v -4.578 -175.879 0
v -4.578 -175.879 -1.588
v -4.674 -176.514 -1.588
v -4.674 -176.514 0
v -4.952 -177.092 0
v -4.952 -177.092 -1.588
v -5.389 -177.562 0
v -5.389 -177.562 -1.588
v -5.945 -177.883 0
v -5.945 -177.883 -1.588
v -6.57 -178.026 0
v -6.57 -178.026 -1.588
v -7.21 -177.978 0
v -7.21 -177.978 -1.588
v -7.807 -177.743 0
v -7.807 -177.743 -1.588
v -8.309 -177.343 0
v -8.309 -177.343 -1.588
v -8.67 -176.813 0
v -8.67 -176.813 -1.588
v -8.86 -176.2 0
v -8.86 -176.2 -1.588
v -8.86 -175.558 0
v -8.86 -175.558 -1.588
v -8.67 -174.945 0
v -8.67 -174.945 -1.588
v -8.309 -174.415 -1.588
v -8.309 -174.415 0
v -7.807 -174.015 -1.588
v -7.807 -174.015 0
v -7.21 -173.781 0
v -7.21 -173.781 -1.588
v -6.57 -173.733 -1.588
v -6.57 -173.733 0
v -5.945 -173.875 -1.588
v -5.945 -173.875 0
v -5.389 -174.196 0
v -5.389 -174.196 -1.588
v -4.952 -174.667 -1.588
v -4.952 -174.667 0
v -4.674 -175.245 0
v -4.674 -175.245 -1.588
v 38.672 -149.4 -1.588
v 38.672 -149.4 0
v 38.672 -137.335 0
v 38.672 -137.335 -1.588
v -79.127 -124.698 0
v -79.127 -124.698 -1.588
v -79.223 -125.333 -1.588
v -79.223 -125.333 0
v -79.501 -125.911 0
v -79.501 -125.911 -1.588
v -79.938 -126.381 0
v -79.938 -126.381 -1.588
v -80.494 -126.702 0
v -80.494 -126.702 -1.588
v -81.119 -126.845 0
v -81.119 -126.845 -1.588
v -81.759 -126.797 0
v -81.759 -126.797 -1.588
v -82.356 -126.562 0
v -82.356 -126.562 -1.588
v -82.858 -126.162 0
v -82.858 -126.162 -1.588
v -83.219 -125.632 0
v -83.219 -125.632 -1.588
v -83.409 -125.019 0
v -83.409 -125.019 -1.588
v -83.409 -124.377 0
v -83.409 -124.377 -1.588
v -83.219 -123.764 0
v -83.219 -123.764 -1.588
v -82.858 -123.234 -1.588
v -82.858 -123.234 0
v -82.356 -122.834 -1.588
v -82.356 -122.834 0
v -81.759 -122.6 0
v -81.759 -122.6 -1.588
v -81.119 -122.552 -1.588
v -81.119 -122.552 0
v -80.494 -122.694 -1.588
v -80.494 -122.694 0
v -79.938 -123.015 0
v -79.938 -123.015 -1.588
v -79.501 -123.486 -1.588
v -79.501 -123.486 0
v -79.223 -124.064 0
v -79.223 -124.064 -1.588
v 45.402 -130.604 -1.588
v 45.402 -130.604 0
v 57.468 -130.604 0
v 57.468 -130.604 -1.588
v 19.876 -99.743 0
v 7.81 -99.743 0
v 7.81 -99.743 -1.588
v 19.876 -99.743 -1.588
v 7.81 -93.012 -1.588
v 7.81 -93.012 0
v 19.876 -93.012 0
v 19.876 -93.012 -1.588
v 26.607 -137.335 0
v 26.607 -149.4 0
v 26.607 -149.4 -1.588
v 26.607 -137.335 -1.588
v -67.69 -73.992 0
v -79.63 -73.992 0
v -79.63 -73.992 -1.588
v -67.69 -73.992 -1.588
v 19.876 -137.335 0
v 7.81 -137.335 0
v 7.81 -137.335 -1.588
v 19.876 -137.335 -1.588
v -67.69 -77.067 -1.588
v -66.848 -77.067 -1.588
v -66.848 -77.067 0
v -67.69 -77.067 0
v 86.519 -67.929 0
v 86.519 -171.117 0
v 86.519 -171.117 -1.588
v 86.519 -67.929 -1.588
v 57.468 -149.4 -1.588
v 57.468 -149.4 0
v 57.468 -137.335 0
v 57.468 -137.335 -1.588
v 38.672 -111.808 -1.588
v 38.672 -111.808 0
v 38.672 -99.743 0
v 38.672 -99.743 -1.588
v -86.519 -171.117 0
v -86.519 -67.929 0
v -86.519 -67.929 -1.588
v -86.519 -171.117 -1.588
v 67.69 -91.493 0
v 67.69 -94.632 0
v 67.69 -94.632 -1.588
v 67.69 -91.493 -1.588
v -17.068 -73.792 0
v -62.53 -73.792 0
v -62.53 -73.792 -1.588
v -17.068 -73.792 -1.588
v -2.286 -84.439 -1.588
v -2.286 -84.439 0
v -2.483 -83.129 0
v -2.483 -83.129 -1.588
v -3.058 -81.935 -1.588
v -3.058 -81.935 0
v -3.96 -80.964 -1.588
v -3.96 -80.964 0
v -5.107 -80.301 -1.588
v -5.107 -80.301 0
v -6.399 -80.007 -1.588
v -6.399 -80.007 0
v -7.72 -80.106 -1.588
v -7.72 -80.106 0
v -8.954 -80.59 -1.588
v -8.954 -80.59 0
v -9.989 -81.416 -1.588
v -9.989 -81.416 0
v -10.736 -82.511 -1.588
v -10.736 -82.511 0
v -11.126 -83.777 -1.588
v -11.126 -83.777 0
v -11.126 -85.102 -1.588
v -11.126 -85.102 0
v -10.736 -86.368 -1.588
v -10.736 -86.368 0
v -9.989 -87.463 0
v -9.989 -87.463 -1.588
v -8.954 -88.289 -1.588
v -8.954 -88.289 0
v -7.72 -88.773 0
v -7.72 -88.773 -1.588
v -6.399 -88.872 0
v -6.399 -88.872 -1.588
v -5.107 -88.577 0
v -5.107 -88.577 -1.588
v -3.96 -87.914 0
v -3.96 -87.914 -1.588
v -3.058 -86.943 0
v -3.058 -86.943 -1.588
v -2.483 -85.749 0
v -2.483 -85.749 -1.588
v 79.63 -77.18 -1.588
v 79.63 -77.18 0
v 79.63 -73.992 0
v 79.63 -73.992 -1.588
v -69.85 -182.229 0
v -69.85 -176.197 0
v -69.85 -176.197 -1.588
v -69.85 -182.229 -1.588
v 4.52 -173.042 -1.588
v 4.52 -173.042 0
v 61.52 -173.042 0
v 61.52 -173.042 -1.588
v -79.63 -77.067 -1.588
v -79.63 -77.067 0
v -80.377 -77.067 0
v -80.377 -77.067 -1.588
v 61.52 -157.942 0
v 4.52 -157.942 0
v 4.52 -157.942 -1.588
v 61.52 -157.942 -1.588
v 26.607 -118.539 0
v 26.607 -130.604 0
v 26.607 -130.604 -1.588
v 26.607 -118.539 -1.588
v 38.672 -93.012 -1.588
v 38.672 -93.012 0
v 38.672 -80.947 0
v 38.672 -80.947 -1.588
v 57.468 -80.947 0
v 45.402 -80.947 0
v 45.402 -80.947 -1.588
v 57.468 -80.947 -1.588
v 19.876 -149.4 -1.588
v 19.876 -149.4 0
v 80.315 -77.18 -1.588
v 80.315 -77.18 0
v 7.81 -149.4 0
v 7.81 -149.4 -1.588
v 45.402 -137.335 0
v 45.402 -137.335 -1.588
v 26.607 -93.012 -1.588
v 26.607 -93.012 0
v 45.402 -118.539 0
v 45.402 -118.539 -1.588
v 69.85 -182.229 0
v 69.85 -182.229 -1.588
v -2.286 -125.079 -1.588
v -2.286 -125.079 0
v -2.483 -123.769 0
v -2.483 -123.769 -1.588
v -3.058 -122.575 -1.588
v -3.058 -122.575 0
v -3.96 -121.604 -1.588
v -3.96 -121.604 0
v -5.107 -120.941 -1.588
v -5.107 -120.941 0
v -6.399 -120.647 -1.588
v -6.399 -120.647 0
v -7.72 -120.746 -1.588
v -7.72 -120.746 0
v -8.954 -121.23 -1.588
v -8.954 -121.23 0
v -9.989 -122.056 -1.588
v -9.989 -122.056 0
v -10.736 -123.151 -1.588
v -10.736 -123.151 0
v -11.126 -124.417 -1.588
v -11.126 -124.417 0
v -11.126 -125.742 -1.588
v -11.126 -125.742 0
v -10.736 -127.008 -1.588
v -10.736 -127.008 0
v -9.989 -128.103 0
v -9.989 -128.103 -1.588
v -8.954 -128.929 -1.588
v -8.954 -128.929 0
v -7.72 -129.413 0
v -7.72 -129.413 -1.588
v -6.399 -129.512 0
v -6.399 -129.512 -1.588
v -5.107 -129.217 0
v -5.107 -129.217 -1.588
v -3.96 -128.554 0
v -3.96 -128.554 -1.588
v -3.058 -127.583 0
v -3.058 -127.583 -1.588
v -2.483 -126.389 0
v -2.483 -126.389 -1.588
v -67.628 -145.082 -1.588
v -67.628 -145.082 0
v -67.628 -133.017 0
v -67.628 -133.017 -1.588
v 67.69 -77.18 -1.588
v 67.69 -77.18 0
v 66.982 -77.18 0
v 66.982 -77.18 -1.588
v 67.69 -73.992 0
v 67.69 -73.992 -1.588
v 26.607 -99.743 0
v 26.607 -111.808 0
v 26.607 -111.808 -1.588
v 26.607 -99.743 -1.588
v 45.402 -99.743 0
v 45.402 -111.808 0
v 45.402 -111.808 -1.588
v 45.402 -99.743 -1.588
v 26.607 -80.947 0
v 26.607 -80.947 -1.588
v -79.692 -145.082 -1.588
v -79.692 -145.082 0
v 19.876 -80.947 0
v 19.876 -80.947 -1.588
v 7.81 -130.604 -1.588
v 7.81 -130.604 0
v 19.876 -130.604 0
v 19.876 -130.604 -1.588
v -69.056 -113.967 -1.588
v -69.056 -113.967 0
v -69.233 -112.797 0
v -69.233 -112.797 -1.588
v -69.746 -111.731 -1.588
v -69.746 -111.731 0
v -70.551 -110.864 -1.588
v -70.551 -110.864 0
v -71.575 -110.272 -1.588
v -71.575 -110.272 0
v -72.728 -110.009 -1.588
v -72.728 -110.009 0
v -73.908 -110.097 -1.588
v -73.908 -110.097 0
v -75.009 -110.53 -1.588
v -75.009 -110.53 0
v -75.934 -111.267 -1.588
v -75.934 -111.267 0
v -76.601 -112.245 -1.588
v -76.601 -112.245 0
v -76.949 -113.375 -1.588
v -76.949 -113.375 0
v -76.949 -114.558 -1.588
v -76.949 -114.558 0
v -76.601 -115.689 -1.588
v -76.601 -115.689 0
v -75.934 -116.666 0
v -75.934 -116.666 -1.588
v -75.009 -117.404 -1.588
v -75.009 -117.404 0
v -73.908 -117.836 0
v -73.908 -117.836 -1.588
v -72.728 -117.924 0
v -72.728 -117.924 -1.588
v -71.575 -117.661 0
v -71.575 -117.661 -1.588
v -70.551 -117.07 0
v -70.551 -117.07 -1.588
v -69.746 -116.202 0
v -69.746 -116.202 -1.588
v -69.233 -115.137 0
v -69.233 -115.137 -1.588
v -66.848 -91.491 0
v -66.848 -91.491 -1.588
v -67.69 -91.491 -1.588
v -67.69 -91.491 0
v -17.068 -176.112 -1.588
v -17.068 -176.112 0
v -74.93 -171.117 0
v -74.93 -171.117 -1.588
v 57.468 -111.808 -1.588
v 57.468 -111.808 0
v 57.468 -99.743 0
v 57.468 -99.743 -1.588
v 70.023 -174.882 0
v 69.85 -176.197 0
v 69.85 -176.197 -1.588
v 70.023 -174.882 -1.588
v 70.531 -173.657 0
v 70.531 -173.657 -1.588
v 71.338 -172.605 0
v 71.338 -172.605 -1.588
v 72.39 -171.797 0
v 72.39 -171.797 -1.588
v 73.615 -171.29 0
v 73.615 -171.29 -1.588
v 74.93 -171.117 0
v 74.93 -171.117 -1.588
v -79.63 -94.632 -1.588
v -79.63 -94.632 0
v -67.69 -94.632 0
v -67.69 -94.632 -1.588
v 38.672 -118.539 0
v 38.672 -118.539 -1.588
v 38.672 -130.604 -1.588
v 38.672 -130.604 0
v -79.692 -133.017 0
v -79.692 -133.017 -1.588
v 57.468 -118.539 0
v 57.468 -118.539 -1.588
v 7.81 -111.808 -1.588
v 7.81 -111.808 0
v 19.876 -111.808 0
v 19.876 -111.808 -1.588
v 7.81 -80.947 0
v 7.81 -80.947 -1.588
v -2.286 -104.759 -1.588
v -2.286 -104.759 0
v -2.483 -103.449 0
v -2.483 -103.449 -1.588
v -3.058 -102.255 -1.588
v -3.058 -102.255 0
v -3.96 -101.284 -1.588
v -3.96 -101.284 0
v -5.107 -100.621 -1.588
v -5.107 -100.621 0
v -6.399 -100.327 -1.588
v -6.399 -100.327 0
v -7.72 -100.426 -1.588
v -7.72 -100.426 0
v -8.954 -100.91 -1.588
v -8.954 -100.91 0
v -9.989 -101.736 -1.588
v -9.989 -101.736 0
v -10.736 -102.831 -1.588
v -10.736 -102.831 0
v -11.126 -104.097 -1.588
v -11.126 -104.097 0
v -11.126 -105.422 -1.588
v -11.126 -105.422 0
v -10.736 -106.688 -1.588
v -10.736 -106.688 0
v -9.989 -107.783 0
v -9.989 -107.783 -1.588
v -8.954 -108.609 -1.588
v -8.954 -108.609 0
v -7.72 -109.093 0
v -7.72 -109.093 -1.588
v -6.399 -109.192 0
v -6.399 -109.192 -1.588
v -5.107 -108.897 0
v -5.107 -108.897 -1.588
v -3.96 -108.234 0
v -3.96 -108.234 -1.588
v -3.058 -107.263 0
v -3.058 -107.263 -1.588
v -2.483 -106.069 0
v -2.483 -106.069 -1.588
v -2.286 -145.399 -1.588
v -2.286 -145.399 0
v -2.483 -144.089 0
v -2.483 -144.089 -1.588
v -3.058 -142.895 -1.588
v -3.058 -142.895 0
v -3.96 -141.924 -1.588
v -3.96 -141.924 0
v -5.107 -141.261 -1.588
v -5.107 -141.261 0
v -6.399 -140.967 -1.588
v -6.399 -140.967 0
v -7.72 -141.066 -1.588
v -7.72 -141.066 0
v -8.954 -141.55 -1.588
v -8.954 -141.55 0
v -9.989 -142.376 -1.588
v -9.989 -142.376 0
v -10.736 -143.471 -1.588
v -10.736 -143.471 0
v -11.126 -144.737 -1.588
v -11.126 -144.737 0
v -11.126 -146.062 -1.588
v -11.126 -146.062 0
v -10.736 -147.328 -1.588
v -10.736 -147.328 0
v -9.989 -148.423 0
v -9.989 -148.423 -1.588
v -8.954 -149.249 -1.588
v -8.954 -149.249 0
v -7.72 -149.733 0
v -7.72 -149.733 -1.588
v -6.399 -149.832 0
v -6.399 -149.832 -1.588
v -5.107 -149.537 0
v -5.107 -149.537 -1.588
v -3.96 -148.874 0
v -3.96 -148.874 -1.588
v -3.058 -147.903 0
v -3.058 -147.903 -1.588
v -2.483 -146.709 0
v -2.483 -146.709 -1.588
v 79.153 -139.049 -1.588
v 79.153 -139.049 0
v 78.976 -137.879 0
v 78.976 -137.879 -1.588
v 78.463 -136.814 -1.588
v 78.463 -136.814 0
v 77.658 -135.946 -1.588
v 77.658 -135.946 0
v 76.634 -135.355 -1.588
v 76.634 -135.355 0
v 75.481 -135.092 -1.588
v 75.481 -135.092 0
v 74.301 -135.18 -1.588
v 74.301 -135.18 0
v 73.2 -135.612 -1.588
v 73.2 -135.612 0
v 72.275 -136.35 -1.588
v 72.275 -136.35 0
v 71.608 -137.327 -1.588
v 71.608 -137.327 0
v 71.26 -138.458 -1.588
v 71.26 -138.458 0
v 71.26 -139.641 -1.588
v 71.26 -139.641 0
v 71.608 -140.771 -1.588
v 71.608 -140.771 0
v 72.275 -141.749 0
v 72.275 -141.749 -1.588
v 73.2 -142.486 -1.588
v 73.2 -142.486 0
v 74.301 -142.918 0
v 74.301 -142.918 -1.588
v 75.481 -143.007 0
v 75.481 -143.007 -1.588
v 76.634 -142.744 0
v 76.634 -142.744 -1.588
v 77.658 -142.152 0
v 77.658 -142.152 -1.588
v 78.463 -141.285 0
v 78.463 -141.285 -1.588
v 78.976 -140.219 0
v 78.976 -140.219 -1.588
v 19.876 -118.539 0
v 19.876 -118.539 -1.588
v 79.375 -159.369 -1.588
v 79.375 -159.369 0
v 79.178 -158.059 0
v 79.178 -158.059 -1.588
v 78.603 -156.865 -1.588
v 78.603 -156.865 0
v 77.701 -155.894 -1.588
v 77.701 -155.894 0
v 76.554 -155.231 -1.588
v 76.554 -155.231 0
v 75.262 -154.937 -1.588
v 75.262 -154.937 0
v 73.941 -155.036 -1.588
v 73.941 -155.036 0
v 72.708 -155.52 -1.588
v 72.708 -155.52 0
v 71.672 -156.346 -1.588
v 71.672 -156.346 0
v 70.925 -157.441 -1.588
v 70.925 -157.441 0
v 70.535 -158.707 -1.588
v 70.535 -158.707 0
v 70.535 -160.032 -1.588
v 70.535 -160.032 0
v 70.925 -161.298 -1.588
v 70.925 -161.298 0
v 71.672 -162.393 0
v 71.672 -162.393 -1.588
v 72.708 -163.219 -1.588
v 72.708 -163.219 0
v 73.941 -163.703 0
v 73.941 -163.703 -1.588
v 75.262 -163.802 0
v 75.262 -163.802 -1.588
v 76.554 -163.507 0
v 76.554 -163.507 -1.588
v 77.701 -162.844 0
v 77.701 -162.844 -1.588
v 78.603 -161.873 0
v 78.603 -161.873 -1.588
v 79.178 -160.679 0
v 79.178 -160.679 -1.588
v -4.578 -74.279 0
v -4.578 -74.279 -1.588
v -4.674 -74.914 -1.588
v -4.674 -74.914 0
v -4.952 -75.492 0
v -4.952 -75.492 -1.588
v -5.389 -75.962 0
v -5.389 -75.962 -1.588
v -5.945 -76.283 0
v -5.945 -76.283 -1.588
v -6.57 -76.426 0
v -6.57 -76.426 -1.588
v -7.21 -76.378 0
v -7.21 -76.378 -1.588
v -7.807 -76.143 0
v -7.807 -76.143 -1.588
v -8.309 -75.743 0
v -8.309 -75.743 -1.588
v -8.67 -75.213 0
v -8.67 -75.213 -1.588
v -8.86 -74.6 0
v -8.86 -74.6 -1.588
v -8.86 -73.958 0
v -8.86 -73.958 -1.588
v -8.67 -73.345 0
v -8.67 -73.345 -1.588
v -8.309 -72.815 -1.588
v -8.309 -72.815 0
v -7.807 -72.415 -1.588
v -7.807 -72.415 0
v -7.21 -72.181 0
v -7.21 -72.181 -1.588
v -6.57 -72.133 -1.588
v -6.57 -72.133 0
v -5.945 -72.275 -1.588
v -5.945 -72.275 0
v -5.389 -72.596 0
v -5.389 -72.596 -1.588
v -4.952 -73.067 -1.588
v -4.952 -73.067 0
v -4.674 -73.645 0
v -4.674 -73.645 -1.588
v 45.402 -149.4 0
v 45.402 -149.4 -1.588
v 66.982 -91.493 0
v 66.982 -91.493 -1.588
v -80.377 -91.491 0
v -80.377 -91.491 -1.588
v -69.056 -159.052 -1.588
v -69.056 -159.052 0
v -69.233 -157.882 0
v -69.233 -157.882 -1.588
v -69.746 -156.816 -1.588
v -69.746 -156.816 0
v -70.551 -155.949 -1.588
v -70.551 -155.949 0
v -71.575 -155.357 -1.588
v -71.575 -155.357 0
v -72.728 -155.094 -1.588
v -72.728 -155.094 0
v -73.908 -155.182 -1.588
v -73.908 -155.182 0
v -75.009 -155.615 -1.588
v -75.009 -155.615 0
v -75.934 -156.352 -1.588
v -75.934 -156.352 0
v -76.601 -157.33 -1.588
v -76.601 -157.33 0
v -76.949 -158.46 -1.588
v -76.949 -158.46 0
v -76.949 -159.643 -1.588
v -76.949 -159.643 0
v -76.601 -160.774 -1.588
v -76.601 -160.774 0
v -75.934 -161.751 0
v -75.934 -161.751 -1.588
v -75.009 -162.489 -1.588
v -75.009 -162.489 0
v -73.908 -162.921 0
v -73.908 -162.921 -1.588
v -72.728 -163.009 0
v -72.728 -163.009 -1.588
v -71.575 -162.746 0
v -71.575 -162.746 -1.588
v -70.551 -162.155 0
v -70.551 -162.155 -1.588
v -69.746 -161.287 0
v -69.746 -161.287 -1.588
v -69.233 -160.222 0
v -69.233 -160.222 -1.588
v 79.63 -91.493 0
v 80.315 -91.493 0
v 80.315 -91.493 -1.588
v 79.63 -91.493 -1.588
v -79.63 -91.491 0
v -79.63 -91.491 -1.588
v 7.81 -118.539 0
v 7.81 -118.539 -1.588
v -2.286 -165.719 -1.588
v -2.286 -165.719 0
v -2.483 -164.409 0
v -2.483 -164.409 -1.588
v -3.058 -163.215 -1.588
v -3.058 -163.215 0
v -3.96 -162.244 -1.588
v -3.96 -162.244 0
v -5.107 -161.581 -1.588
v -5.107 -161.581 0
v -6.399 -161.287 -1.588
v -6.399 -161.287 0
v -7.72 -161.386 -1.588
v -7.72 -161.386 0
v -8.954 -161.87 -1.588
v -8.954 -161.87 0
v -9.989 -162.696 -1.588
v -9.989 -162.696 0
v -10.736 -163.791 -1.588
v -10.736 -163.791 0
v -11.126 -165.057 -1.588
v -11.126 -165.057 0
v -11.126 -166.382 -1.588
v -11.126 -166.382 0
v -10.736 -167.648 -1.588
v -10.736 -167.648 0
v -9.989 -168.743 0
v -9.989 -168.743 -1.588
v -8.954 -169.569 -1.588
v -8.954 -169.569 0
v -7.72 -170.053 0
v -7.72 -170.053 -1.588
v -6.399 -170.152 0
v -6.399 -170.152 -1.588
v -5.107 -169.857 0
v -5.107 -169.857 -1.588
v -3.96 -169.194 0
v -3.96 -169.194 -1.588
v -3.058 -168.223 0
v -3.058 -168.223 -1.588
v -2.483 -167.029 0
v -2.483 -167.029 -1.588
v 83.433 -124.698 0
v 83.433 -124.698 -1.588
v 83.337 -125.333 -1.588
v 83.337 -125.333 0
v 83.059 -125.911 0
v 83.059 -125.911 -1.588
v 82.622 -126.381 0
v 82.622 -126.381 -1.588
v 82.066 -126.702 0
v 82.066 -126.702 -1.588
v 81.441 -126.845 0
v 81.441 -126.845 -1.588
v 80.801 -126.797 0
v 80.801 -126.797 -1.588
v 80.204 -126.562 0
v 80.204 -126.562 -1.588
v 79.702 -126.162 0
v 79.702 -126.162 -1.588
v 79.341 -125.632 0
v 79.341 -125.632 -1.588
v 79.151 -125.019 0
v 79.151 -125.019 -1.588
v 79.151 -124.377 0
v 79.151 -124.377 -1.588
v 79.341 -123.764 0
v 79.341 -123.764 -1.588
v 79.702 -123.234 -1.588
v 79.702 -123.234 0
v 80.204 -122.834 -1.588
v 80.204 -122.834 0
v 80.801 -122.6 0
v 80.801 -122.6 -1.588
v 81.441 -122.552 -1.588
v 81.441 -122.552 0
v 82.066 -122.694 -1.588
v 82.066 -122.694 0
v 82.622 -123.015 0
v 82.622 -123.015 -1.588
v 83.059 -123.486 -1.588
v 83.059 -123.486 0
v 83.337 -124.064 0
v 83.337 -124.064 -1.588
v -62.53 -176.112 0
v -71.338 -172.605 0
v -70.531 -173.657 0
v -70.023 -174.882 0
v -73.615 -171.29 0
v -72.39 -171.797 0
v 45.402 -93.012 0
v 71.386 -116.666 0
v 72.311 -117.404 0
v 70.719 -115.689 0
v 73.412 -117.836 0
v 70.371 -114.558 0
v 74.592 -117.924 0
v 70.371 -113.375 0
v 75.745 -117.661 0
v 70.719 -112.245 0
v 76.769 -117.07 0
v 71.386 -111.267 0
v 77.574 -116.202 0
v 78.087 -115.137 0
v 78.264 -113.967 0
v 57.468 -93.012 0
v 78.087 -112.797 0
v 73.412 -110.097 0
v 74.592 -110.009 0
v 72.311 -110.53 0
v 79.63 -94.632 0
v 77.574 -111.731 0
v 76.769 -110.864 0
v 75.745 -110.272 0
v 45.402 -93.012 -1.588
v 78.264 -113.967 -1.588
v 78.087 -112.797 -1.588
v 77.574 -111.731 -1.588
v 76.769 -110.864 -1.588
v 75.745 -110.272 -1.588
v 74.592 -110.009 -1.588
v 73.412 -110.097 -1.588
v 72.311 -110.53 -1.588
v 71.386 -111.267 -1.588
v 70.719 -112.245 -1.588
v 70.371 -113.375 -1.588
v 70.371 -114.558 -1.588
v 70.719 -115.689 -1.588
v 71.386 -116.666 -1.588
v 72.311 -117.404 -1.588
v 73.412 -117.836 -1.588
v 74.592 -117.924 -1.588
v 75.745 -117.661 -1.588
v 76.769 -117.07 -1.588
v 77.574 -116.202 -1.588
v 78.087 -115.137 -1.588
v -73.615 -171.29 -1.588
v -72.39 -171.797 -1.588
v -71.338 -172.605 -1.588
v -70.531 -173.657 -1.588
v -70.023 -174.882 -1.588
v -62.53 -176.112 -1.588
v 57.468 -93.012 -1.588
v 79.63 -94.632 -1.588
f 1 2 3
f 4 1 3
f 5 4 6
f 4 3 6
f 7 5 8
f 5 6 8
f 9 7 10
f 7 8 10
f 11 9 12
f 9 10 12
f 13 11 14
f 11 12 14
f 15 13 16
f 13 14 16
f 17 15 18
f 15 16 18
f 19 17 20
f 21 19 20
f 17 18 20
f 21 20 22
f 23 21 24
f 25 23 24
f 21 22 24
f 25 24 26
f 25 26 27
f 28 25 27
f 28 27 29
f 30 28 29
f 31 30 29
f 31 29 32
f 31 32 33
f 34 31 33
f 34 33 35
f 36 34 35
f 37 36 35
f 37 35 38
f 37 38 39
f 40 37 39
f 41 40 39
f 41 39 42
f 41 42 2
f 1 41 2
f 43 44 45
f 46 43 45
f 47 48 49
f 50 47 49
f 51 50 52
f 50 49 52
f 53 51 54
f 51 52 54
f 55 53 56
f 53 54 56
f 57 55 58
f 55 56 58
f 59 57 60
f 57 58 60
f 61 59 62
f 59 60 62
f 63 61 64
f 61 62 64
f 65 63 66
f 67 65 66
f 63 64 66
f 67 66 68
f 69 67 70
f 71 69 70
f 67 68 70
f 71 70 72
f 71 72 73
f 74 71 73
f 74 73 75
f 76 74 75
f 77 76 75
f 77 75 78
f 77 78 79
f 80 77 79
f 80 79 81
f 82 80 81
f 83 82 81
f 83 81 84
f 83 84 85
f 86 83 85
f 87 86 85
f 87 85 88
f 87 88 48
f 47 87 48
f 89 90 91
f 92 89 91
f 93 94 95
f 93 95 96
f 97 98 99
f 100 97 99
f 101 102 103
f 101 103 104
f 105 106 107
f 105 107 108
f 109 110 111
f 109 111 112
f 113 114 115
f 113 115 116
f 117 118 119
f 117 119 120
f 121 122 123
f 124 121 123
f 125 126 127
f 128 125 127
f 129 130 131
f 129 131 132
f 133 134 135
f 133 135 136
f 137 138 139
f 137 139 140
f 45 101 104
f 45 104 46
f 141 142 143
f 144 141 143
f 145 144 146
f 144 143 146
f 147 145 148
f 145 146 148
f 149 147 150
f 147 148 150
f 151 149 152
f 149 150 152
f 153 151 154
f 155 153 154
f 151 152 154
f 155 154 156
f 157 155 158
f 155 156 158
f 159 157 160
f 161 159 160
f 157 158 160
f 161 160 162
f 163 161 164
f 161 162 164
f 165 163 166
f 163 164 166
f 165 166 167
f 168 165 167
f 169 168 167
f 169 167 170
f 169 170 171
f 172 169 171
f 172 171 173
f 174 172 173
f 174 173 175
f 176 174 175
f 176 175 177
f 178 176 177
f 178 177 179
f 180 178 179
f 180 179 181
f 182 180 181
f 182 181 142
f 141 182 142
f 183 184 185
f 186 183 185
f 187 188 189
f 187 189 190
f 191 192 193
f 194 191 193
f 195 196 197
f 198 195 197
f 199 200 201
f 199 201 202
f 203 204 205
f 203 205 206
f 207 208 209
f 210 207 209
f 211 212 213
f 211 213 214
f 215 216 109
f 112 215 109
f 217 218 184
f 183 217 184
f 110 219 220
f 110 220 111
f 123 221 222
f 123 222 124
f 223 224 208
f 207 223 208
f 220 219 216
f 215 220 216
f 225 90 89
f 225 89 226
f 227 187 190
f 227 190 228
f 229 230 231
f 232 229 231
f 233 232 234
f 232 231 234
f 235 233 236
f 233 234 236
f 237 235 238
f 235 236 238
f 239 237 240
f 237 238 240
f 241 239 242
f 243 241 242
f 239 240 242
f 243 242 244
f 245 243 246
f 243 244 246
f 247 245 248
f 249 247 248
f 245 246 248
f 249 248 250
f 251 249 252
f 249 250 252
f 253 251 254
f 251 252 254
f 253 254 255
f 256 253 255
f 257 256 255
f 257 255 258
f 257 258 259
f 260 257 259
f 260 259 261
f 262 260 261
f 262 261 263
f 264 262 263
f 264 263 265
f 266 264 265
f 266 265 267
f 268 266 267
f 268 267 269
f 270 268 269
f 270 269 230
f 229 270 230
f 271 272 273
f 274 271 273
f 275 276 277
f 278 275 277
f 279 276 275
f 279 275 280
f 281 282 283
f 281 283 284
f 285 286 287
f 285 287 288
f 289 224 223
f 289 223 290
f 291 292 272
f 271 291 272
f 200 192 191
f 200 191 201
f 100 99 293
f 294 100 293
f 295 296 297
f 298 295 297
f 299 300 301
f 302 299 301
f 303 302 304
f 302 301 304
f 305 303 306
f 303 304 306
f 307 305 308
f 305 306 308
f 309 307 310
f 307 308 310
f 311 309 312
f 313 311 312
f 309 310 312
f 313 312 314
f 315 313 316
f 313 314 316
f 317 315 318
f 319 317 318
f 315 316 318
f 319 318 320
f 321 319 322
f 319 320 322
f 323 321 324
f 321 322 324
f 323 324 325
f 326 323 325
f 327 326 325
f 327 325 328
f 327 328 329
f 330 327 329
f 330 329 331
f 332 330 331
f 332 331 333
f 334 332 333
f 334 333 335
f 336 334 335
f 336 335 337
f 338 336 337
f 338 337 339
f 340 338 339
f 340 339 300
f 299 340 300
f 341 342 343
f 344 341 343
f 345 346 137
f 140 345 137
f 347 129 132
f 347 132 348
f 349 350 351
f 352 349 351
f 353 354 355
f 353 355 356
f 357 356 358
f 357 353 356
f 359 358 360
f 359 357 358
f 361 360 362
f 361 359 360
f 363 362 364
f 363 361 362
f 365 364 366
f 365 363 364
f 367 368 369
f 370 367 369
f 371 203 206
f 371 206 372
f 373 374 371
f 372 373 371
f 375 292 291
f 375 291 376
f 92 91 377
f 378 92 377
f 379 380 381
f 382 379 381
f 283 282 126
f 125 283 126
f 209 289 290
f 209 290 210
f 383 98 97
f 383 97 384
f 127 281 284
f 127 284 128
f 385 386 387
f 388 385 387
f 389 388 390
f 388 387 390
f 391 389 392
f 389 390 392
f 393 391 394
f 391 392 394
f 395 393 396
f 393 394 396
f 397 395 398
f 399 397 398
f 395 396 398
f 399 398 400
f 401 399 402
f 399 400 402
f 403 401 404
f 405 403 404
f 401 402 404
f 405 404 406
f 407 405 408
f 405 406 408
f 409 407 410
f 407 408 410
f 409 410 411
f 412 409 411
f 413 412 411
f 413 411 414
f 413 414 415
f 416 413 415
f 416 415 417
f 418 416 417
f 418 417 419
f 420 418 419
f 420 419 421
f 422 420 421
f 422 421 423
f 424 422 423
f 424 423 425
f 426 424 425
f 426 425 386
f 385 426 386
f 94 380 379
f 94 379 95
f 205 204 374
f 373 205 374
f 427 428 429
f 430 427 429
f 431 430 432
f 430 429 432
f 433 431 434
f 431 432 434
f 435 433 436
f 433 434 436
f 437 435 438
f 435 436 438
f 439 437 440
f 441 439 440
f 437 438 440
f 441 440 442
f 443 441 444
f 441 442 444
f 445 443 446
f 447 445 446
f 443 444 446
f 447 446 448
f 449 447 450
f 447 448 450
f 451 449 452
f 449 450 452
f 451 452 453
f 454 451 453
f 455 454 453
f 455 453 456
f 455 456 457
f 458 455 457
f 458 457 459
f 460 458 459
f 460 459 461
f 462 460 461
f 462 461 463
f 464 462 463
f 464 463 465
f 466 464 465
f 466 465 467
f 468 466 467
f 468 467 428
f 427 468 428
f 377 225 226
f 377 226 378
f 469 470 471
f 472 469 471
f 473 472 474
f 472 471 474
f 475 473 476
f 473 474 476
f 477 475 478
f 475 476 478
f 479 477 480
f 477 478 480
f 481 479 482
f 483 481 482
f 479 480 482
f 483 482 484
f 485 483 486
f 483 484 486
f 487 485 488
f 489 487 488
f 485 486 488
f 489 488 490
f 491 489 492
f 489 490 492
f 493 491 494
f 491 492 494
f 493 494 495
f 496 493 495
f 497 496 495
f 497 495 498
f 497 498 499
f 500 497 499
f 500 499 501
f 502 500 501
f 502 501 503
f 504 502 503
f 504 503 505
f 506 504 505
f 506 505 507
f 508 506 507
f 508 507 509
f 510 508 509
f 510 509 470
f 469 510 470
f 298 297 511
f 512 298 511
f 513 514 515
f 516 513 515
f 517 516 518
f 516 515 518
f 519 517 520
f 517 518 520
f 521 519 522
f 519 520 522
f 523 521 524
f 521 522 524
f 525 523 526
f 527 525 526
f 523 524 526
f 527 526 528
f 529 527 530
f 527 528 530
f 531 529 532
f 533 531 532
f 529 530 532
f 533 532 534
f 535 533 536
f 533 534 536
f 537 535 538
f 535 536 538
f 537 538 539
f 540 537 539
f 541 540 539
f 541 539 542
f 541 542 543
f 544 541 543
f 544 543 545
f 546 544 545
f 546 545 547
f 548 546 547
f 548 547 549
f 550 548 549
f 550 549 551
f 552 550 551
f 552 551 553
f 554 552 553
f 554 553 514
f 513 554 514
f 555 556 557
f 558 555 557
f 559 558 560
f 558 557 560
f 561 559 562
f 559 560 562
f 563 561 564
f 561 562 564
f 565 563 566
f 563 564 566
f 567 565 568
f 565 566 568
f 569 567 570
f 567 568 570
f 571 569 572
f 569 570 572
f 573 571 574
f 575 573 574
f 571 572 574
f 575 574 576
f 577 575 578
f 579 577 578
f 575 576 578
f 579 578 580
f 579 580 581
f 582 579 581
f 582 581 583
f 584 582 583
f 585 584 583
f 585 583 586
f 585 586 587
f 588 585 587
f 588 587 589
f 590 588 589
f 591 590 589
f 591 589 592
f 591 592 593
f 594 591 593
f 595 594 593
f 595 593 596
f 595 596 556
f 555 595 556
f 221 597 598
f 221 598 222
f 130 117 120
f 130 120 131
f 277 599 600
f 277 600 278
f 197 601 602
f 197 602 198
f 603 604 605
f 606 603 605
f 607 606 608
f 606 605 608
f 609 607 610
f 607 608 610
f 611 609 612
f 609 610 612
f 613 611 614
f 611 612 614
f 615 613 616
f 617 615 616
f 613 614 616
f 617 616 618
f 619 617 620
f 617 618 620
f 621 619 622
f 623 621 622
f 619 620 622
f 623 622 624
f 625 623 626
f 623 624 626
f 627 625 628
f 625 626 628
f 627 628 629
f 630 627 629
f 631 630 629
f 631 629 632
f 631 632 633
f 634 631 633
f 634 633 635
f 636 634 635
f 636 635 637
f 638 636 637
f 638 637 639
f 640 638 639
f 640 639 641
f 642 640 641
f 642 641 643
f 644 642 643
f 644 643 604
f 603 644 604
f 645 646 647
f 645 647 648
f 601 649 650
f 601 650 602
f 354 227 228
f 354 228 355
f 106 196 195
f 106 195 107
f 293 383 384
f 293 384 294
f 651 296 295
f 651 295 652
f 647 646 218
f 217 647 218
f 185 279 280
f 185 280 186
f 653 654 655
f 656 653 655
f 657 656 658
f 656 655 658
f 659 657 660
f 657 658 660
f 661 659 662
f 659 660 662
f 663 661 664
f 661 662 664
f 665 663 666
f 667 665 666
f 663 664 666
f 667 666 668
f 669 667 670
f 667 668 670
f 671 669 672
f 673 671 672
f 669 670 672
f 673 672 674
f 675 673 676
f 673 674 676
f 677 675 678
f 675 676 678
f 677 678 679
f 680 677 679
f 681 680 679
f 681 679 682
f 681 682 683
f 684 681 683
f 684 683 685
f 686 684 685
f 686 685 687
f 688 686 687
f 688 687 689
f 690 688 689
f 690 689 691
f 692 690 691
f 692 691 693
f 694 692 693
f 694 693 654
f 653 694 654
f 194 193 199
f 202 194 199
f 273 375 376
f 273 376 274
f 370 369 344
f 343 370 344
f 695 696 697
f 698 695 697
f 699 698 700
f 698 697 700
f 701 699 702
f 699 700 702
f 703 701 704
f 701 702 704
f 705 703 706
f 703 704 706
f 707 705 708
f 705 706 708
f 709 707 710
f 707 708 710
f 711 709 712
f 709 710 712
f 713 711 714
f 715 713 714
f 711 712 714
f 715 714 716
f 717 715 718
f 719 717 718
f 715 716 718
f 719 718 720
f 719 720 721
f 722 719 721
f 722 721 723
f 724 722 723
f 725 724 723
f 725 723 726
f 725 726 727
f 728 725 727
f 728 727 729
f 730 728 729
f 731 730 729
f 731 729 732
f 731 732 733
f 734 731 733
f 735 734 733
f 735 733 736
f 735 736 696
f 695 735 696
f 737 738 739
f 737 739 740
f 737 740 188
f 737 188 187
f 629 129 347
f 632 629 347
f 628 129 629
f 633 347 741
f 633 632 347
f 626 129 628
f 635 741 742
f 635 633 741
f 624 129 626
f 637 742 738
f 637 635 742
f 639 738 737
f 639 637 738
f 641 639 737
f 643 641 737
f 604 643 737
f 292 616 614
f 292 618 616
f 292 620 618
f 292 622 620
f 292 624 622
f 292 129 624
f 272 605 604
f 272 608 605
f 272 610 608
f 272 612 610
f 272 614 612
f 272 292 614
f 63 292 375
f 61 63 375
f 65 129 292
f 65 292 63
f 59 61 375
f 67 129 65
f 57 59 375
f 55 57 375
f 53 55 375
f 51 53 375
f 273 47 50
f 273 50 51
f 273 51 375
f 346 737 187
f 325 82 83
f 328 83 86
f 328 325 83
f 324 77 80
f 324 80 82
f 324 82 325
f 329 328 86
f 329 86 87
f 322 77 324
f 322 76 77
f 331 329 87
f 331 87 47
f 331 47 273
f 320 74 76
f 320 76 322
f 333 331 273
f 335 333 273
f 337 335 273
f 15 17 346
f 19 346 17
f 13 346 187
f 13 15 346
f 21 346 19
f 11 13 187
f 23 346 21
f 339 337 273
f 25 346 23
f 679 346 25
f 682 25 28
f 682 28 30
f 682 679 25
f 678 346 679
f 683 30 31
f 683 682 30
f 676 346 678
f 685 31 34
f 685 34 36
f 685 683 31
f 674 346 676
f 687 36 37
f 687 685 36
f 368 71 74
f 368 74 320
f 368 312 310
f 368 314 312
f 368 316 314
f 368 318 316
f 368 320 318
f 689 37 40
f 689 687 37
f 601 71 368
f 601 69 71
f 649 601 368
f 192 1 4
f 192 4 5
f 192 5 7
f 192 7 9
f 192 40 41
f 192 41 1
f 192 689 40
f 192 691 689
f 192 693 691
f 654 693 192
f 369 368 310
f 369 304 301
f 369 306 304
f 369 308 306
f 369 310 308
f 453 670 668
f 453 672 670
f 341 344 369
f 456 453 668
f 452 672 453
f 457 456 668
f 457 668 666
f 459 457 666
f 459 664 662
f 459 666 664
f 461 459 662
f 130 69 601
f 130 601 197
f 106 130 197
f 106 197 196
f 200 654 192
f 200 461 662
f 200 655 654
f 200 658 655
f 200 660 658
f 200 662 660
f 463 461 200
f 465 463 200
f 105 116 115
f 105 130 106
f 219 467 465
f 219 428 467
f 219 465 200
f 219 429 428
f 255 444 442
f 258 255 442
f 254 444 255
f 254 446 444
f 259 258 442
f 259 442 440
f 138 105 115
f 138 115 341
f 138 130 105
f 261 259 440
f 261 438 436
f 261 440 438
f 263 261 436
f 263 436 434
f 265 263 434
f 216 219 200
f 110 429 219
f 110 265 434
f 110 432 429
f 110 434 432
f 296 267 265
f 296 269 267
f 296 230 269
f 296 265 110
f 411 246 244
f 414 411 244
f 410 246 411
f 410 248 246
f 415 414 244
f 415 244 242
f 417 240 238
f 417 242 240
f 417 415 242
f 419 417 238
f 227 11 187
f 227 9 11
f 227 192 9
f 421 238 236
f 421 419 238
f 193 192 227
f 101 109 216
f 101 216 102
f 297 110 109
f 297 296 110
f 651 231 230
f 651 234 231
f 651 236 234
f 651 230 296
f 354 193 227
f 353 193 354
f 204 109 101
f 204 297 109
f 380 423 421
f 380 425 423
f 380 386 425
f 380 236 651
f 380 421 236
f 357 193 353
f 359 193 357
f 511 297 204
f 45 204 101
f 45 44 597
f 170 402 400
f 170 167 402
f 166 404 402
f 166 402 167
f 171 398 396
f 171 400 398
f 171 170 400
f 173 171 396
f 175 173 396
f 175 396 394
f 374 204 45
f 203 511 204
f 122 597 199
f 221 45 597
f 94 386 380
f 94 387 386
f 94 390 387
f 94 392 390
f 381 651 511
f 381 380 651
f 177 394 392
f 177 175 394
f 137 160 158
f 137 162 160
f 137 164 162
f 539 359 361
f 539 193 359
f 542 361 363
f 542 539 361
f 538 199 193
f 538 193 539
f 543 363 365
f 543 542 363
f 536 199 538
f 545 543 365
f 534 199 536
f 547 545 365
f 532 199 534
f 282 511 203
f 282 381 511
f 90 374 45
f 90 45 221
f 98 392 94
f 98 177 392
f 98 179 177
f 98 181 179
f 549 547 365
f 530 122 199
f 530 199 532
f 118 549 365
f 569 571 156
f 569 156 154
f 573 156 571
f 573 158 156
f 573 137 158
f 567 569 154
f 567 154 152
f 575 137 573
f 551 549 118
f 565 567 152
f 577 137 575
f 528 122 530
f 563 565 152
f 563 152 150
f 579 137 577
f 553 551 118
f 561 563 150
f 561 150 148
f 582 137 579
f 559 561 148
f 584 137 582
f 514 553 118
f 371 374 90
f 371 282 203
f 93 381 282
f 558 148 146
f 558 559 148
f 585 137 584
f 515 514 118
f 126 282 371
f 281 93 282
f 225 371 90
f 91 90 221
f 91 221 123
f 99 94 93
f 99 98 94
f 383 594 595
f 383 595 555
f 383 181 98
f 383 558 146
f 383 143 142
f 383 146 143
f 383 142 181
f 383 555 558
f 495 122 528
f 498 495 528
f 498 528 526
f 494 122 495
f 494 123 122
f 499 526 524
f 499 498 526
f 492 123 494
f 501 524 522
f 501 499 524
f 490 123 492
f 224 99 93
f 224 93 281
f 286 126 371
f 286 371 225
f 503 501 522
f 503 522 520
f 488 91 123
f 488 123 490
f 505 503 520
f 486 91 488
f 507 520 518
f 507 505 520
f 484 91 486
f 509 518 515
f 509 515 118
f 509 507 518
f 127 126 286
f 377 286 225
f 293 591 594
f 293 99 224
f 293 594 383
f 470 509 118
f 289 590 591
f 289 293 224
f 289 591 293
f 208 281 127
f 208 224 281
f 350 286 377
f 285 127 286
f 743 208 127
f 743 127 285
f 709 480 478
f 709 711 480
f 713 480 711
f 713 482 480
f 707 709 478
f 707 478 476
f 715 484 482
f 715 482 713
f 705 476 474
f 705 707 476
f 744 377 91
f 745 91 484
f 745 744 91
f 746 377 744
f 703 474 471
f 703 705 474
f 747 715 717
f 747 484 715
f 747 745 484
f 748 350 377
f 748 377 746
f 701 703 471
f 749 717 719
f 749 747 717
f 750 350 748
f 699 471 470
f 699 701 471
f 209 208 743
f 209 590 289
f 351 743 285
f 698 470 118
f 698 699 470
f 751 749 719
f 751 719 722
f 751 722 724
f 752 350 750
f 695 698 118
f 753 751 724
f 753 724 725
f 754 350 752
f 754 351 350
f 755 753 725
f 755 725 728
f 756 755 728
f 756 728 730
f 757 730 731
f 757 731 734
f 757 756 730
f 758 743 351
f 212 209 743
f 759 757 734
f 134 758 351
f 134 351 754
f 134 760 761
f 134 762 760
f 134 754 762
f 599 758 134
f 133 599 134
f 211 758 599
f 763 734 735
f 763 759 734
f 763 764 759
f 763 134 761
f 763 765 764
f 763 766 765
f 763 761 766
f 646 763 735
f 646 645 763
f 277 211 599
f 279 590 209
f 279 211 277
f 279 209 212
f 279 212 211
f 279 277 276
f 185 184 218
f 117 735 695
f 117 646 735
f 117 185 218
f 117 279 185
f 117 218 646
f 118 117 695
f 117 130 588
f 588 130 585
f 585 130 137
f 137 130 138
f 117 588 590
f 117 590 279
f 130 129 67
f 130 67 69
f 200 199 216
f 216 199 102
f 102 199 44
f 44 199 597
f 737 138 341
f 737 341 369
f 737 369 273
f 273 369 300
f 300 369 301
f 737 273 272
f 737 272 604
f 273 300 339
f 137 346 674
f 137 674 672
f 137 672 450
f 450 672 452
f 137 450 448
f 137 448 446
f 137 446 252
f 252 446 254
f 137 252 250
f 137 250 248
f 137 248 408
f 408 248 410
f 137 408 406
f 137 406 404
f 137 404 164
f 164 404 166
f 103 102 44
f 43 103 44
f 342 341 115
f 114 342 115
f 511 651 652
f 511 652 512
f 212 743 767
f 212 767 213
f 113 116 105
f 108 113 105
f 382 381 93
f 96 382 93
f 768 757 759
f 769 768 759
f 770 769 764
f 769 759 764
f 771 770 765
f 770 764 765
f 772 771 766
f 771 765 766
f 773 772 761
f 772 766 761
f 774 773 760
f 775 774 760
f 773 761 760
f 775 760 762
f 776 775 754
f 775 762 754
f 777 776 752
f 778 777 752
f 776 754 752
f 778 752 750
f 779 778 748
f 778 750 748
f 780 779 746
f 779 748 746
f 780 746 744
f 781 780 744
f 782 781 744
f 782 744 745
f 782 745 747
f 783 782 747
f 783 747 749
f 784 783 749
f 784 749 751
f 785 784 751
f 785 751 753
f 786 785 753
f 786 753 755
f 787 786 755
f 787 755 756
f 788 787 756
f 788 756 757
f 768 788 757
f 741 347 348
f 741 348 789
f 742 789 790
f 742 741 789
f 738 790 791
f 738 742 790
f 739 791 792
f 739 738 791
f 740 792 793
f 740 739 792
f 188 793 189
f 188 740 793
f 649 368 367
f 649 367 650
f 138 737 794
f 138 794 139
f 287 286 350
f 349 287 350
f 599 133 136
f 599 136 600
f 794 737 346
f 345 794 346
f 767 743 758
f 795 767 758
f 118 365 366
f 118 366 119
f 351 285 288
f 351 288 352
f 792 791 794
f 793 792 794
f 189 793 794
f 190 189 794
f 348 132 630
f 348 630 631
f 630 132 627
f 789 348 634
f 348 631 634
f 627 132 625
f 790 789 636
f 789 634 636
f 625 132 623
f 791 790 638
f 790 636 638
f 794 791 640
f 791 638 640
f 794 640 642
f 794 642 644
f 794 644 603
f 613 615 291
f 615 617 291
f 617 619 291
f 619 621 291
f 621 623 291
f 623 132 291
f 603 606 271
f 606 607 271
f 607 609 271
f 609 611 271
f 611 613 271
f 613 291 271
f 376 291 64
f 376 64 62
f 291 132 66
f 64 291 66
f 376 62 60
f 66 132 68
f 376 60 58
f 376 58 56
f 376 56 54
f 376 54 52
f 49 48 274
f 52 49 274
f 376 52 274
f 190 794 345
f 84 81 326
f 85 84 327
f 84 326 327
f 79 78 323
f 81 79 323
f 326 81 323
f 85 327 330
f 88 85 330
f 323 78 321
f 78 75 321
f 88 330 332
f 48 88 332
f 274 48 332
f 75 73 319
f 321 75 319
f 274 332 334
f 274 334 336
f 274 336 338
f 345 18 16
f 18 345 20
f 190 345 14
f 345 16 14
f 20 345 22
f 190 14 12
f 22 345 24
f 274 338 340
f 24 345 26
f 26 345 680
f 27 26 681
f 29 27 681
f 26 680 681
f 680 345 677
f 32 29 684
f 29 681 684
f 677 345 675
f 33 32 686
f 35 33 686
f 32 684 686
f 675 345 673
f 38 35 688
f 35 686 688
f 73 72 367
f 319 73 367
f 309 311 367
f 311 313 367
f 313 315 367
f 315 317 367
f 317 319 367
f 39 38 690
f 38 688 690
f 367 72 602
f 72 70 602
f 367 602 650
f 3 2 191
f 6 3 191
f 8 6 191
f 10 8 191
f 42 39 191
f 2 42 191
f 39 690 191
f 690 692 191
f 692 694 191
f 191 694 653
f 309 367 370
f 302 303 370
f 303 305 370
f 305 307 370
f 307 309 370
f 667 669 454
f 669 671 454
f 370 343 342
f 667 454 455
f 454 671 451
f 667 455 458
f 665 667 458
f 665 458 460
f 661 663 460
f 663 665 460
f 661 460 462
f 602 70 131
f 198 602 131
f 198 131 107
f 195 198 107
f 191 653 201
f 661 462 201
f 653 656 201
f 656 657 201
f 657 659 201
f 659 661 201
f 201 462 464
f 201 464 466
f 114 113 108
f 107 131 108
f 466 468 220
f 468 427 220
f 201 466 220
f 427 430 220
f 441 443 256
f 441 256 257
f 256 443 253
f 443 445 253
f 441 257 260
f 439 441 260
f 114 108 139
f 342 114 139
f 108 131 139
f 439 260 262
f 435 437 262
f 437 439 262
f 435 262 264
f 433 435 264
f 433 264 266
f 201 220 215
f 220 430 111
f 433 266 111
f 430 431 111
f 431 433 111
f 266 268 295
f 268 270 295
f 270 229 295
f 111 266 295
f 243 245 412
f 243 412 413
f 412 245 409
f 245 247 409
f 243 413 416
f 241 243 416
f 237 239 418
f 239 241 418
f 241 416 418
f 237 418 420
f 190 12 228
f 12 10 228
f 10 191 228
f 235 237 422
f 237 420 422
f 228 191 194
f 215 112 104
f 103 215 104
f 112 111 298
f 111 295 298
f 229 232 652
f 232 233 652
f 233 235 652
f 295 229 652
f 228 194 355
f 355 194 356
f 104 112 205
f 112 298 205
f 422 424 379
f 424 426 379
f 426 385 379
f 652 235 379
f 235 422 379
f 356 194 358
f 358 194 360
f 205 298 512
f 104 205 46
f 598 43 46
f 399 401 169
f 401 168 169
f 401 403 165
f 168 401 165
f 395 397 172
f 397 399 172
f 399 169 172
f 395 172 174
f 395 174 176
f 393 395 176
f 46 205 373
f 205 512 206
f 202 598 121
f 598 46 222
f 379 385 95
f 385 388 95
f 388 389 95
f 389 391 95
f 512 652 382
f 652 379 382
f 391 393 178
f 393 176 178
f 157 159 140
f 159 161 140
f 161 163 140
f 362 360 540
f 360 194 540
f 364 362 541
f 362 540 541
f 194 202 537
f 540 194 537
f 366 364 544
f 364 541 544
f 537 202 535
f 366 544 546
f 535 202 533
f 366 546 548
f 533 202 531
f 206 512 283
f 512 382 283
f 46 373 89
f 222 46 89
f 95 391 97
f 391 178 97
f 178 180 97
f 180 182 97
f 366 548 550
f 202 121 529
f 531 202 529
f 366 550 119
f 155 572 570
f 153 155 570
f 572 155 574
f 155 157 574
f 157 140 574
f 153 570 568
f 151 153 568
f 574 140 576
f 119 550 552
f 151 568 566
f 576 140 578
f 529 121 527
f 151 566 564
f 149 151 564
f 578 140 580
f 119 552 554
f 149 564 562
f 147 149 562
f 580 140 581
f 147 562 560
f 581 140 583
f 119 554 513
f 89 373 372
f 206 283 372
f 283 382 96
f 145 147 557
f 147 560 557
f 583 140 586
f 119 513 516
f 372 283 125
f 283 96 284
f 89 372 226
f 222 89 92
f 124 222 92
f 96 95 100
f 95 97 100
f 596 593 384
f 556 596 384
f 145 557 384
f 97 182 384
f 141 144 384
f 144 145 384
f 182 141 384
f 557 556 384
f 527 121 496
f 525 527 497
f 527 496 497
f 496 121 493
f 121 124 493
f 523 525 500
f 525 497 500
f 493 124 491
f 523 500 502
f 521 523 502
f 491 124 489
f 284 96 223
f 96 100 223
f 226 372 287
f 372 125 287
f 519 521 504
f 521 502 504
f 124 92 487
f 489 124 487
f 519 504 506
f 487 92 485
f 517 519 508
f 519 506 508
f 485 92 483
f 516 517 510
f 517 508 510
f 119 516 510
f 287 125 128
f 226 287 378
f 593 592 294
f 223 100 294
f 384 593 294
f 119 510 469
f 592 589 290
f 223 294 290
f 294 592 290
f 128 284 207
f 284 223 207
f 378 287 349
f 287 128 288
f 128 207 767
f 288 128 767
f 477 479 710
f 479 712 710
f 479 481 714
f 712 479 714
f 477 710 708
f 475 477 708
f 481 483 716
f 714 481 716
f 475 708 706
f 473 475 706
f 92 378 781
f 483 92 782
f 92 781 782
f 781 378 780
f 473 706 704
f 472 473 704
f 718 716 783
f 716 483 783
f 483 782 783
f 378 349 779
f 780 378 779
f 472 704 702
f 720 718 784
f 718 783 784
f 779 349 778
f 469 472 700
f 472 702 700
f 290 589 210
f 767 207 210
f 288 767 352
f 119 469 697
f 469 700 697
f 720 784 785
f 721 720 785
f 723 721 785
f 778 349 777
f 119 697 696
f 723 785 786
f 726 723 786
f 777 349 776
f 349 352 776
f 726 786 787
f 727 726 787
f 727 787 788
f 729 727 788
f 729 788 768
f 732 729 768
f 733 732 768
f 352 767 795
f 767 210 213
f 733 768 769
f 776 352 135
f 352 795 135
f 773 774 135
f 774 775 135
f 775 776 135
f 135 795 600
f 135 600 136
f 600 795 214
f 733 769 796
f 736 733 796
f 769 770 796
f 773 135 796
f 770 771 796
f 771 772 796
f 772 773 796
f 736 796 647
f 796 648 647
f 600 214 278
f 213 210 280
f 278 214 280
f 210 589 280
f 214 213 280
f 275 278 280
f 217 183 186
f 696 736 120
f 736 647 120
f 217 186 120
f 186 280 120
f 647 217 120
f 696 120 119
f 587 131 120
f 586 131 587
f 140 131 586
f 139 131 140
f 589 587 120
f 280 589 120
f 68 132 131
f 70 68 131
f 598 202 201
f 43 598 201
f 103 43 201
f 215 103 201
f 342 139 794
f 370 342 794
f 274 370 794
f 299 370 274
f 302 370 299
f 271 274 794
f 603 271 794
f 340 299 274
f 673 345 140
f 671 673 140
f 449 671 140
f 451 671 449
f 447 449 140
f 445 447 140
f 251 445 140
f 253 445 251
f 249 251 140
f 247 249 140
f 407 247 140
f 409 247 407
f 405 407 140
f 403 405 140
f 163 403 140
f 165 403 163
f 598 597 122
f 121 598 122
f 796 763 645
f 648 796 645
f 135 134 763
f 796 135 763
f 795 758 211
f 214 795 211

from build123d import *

# Parameters (mm, degrees)
BOSS_EXTRUDE1_DEPTH   = 1.5875
SKETCH3_R             = 4.445
SKETCH3_W             = 12.065
SKETCH3_H             = 12.065
CUT_EXTRUDE1_DEPTH    = 2.5875
SKETCH4_R             = 3.96875
CUT_EXTRUDE2_DEPTH    = 2.5875
SKETCH5_W             = 11.94
SKETCH5_H             = 20.64
SKETCH5_W_2           = 45.462
SKETCH5_H_2           = 102.32
SKETCH5_W_3           = 57
SKETCH5_H_3           = 15.1
CUT_EXTRUDE3_DEPTH    = 2.5875
F_6_CLEARANCE_HOLE2_D = 4.3053
CUT_EXTRUDE4_START    = -1.5875
SKETCH11_W            = 13.529020254
SKETCH11_H            = 14.424558238
SKETCH11_W_2          = 13.332833864
SKETCH11_H_2          = 14.312726797
CUT_EXTRUDE4_DEPTH    = 1.5875


with BuildPart() as part:
    # Sketch1 → Boss-Extrude1 (new body)
    with BuildSketch(Plane.XY):
        with BuildLine():
            Line((74.93, -171.1167297), (86.51875, -171.1167297))
            Line((86.51875, -171.1167297), (86.51875, -67.9292297))
            Line((86.51875, -67.9292297), (-86.51875, -67.9292297))
            Line((-86.51875, -67.9292297), (-86.51875, -171.1167297))
            Line((-86.51875, -171.1167297), (-74.93, -171.1167297))
            ThreePointArc((-74.93, -171.1167297), (-71.337897552, -172.604627251), (-69.85, -176.1967297))
            Line((-69.85, -176.1967297), (-69.85, -182.2292297))
            Line((-69.85, -182.2292297), (69.85, -182.2292297))
            Line((69.85, -182.2292297), (69.85, -176.1967297))
            ThreePointArc((69.85, -176.1967297), (71.337897552, -172.604627251), (74.93, -171.1167297))
        make_face()
    extrude(amount=-BOSS_EXTRUDE1_DEPTH)

    # Sketch3 → Cut-Extrude1 (cut, through all)
    with BuildSketch(Plane.XY):
        with Locations((74.93, -159.3692297)):
            Circle(SKETCH3_R)
        with Locations((-6.731, -165.7192297)):
            Circle(SKETCH3_R)
        with Locations((-6.731, -145.3992297)):
            Circle(SKETCH3_R)
        with Locations((-6.731, -125.0792297)):
            Circle(SKETCH3_R)
        with Locations((-6.731, -104.7592297)):
            Circle(SKETCH3_R)
        with Locations((-6.731, -84.4392297)):
            Circle(SKETCH3_R)
        with Locations((-73.66, -139.0492297)):
            Rectangle(SKETCH3_W, SKETCH3_H)
        with Locations((13.843, -143.3672297)):
            Rectangle(SKETCH3_W, SKETCH3_H)
        with Locations((32.639, -143.3672297)):
            Rectangle(SKETCH3_W, SKETCH3_H)
        with Locations((51.435, -143.3672297)):
            Rectangle(SKETCH3_W, SKETCH3_H)
        with Locations((51.435, -124.5712297)):
            Rectangle(SKETCH3_W, SKETCH3_H)
        with Locations((32.639, -124.5712297)):
            Rectangle(SKETCH3_W, SKETCH3_H)
        with Locations((13.843, -124.5712297)):
            Rectangle(SKETCH3_W, SKETCH3_H)
        with Locations((13.843, -105.7752297)):
            Rectangle(SKETCH3_W, SKETCH3_H)
        with Locations((13.843, -86.9792297)):
            Rectangle(SKETCH3_W, SKETCH3_H)
        with Locations((32.639, -86.9792297)):
            Rectangle(SKETCH3_W, SKETCH3_H)
        with Locations((32.639, -105.7752297)):
            Rectangle(SKETCH3_W, SKETCH3_H)
        with Locations((51.435, -105.7752297)):
            Rectangle(SKETCH3_W, SKETCH3_H)
        with Locations((51.435, -86.9792297)):
            Rectangle(SKETCH3_W, SKETCH3_H)
    extrude(amount=-CUT_EXTRUDE1_DEPTH, mode=Mode.SUBTRACT)

    # Sketch4 → Cut-Extrude2 (cut, through all)
    with BuildSketch(Plane.XY):
        with Locations((-73.025, -113.9667297)):
            Circle(SKETCH4_R)
        with Locations((-73.025, -159.0517297)):
            Circle(SKETCH4_R)
        with Locations((74.295, -113.9667297)):
            Circle(SKETCH4_R)
        with Locations((75.184, -139.0492297)):
            Circle(SKETCH4_R)
    extrude(amount=-CUT_EXTRUDE2_DEPTH, mode=Mode.SUBTRACT)

    # Sketch5 → Cut-Extrude3 (cut, through all)
    with BuildSketch(Plane.XY):
        with Locations((-73.66, -84.3122297)):
            Rectangle(SKETCH5_W, SKETCH5_H)
        with Locations((73.66, -84.3122297)):
            Rectangle(SKETCH5_W, SKETCH5_H)
        with Locations((-39.799, -124.9522297)):
            Rectangle(SKETCH5_W_2, SKETCH5_H_2)
        with Locations((33.02, -165.4922297)):
            Rectangle(SKETCH5_W_3, SKETCH5_H_3)
    extrude(amount=-CUT_EXTRUDE3_DEPTH, mode=Mode.SUBTRACT)

    # #6 Clearance Hole2 (through all)
    with Locations(Plane(origin=(0, 0, 0), x_dir=(-1, 0, 0), z_dir=(0, 0, 1))):
        with Locations((-81.28, 124.6982297), (6.731, 175.8792297), (81.28, 124.6982297), (6.731, 74.2792297)):
            Hole(F_6_CLEARANCE_HOLE2_D / 2)

    # Sketch11 → Cut-Extrude4 (cut)
    with BuildSketch(Plane(origin=(0, 0, -1.5875), x_dir=(-1, 0, 0), z_dir=(0, 0, -1)).offset(CUT_EXTRUDE4_START)):
        with Locations((73.612537257, -84.279184845)):
            Rectangle(SKETCH11_W, SKETCH11_H)
        with Locations((-73.648214967, -84.336507402)):
            Rectangle(SKETCH11_W_2, SKETCH11_H_2)
    extrude(amount=CUT_EXTRUDE4_DEPTH, mode=Mode.SUBTRACT)


solid = part.part
